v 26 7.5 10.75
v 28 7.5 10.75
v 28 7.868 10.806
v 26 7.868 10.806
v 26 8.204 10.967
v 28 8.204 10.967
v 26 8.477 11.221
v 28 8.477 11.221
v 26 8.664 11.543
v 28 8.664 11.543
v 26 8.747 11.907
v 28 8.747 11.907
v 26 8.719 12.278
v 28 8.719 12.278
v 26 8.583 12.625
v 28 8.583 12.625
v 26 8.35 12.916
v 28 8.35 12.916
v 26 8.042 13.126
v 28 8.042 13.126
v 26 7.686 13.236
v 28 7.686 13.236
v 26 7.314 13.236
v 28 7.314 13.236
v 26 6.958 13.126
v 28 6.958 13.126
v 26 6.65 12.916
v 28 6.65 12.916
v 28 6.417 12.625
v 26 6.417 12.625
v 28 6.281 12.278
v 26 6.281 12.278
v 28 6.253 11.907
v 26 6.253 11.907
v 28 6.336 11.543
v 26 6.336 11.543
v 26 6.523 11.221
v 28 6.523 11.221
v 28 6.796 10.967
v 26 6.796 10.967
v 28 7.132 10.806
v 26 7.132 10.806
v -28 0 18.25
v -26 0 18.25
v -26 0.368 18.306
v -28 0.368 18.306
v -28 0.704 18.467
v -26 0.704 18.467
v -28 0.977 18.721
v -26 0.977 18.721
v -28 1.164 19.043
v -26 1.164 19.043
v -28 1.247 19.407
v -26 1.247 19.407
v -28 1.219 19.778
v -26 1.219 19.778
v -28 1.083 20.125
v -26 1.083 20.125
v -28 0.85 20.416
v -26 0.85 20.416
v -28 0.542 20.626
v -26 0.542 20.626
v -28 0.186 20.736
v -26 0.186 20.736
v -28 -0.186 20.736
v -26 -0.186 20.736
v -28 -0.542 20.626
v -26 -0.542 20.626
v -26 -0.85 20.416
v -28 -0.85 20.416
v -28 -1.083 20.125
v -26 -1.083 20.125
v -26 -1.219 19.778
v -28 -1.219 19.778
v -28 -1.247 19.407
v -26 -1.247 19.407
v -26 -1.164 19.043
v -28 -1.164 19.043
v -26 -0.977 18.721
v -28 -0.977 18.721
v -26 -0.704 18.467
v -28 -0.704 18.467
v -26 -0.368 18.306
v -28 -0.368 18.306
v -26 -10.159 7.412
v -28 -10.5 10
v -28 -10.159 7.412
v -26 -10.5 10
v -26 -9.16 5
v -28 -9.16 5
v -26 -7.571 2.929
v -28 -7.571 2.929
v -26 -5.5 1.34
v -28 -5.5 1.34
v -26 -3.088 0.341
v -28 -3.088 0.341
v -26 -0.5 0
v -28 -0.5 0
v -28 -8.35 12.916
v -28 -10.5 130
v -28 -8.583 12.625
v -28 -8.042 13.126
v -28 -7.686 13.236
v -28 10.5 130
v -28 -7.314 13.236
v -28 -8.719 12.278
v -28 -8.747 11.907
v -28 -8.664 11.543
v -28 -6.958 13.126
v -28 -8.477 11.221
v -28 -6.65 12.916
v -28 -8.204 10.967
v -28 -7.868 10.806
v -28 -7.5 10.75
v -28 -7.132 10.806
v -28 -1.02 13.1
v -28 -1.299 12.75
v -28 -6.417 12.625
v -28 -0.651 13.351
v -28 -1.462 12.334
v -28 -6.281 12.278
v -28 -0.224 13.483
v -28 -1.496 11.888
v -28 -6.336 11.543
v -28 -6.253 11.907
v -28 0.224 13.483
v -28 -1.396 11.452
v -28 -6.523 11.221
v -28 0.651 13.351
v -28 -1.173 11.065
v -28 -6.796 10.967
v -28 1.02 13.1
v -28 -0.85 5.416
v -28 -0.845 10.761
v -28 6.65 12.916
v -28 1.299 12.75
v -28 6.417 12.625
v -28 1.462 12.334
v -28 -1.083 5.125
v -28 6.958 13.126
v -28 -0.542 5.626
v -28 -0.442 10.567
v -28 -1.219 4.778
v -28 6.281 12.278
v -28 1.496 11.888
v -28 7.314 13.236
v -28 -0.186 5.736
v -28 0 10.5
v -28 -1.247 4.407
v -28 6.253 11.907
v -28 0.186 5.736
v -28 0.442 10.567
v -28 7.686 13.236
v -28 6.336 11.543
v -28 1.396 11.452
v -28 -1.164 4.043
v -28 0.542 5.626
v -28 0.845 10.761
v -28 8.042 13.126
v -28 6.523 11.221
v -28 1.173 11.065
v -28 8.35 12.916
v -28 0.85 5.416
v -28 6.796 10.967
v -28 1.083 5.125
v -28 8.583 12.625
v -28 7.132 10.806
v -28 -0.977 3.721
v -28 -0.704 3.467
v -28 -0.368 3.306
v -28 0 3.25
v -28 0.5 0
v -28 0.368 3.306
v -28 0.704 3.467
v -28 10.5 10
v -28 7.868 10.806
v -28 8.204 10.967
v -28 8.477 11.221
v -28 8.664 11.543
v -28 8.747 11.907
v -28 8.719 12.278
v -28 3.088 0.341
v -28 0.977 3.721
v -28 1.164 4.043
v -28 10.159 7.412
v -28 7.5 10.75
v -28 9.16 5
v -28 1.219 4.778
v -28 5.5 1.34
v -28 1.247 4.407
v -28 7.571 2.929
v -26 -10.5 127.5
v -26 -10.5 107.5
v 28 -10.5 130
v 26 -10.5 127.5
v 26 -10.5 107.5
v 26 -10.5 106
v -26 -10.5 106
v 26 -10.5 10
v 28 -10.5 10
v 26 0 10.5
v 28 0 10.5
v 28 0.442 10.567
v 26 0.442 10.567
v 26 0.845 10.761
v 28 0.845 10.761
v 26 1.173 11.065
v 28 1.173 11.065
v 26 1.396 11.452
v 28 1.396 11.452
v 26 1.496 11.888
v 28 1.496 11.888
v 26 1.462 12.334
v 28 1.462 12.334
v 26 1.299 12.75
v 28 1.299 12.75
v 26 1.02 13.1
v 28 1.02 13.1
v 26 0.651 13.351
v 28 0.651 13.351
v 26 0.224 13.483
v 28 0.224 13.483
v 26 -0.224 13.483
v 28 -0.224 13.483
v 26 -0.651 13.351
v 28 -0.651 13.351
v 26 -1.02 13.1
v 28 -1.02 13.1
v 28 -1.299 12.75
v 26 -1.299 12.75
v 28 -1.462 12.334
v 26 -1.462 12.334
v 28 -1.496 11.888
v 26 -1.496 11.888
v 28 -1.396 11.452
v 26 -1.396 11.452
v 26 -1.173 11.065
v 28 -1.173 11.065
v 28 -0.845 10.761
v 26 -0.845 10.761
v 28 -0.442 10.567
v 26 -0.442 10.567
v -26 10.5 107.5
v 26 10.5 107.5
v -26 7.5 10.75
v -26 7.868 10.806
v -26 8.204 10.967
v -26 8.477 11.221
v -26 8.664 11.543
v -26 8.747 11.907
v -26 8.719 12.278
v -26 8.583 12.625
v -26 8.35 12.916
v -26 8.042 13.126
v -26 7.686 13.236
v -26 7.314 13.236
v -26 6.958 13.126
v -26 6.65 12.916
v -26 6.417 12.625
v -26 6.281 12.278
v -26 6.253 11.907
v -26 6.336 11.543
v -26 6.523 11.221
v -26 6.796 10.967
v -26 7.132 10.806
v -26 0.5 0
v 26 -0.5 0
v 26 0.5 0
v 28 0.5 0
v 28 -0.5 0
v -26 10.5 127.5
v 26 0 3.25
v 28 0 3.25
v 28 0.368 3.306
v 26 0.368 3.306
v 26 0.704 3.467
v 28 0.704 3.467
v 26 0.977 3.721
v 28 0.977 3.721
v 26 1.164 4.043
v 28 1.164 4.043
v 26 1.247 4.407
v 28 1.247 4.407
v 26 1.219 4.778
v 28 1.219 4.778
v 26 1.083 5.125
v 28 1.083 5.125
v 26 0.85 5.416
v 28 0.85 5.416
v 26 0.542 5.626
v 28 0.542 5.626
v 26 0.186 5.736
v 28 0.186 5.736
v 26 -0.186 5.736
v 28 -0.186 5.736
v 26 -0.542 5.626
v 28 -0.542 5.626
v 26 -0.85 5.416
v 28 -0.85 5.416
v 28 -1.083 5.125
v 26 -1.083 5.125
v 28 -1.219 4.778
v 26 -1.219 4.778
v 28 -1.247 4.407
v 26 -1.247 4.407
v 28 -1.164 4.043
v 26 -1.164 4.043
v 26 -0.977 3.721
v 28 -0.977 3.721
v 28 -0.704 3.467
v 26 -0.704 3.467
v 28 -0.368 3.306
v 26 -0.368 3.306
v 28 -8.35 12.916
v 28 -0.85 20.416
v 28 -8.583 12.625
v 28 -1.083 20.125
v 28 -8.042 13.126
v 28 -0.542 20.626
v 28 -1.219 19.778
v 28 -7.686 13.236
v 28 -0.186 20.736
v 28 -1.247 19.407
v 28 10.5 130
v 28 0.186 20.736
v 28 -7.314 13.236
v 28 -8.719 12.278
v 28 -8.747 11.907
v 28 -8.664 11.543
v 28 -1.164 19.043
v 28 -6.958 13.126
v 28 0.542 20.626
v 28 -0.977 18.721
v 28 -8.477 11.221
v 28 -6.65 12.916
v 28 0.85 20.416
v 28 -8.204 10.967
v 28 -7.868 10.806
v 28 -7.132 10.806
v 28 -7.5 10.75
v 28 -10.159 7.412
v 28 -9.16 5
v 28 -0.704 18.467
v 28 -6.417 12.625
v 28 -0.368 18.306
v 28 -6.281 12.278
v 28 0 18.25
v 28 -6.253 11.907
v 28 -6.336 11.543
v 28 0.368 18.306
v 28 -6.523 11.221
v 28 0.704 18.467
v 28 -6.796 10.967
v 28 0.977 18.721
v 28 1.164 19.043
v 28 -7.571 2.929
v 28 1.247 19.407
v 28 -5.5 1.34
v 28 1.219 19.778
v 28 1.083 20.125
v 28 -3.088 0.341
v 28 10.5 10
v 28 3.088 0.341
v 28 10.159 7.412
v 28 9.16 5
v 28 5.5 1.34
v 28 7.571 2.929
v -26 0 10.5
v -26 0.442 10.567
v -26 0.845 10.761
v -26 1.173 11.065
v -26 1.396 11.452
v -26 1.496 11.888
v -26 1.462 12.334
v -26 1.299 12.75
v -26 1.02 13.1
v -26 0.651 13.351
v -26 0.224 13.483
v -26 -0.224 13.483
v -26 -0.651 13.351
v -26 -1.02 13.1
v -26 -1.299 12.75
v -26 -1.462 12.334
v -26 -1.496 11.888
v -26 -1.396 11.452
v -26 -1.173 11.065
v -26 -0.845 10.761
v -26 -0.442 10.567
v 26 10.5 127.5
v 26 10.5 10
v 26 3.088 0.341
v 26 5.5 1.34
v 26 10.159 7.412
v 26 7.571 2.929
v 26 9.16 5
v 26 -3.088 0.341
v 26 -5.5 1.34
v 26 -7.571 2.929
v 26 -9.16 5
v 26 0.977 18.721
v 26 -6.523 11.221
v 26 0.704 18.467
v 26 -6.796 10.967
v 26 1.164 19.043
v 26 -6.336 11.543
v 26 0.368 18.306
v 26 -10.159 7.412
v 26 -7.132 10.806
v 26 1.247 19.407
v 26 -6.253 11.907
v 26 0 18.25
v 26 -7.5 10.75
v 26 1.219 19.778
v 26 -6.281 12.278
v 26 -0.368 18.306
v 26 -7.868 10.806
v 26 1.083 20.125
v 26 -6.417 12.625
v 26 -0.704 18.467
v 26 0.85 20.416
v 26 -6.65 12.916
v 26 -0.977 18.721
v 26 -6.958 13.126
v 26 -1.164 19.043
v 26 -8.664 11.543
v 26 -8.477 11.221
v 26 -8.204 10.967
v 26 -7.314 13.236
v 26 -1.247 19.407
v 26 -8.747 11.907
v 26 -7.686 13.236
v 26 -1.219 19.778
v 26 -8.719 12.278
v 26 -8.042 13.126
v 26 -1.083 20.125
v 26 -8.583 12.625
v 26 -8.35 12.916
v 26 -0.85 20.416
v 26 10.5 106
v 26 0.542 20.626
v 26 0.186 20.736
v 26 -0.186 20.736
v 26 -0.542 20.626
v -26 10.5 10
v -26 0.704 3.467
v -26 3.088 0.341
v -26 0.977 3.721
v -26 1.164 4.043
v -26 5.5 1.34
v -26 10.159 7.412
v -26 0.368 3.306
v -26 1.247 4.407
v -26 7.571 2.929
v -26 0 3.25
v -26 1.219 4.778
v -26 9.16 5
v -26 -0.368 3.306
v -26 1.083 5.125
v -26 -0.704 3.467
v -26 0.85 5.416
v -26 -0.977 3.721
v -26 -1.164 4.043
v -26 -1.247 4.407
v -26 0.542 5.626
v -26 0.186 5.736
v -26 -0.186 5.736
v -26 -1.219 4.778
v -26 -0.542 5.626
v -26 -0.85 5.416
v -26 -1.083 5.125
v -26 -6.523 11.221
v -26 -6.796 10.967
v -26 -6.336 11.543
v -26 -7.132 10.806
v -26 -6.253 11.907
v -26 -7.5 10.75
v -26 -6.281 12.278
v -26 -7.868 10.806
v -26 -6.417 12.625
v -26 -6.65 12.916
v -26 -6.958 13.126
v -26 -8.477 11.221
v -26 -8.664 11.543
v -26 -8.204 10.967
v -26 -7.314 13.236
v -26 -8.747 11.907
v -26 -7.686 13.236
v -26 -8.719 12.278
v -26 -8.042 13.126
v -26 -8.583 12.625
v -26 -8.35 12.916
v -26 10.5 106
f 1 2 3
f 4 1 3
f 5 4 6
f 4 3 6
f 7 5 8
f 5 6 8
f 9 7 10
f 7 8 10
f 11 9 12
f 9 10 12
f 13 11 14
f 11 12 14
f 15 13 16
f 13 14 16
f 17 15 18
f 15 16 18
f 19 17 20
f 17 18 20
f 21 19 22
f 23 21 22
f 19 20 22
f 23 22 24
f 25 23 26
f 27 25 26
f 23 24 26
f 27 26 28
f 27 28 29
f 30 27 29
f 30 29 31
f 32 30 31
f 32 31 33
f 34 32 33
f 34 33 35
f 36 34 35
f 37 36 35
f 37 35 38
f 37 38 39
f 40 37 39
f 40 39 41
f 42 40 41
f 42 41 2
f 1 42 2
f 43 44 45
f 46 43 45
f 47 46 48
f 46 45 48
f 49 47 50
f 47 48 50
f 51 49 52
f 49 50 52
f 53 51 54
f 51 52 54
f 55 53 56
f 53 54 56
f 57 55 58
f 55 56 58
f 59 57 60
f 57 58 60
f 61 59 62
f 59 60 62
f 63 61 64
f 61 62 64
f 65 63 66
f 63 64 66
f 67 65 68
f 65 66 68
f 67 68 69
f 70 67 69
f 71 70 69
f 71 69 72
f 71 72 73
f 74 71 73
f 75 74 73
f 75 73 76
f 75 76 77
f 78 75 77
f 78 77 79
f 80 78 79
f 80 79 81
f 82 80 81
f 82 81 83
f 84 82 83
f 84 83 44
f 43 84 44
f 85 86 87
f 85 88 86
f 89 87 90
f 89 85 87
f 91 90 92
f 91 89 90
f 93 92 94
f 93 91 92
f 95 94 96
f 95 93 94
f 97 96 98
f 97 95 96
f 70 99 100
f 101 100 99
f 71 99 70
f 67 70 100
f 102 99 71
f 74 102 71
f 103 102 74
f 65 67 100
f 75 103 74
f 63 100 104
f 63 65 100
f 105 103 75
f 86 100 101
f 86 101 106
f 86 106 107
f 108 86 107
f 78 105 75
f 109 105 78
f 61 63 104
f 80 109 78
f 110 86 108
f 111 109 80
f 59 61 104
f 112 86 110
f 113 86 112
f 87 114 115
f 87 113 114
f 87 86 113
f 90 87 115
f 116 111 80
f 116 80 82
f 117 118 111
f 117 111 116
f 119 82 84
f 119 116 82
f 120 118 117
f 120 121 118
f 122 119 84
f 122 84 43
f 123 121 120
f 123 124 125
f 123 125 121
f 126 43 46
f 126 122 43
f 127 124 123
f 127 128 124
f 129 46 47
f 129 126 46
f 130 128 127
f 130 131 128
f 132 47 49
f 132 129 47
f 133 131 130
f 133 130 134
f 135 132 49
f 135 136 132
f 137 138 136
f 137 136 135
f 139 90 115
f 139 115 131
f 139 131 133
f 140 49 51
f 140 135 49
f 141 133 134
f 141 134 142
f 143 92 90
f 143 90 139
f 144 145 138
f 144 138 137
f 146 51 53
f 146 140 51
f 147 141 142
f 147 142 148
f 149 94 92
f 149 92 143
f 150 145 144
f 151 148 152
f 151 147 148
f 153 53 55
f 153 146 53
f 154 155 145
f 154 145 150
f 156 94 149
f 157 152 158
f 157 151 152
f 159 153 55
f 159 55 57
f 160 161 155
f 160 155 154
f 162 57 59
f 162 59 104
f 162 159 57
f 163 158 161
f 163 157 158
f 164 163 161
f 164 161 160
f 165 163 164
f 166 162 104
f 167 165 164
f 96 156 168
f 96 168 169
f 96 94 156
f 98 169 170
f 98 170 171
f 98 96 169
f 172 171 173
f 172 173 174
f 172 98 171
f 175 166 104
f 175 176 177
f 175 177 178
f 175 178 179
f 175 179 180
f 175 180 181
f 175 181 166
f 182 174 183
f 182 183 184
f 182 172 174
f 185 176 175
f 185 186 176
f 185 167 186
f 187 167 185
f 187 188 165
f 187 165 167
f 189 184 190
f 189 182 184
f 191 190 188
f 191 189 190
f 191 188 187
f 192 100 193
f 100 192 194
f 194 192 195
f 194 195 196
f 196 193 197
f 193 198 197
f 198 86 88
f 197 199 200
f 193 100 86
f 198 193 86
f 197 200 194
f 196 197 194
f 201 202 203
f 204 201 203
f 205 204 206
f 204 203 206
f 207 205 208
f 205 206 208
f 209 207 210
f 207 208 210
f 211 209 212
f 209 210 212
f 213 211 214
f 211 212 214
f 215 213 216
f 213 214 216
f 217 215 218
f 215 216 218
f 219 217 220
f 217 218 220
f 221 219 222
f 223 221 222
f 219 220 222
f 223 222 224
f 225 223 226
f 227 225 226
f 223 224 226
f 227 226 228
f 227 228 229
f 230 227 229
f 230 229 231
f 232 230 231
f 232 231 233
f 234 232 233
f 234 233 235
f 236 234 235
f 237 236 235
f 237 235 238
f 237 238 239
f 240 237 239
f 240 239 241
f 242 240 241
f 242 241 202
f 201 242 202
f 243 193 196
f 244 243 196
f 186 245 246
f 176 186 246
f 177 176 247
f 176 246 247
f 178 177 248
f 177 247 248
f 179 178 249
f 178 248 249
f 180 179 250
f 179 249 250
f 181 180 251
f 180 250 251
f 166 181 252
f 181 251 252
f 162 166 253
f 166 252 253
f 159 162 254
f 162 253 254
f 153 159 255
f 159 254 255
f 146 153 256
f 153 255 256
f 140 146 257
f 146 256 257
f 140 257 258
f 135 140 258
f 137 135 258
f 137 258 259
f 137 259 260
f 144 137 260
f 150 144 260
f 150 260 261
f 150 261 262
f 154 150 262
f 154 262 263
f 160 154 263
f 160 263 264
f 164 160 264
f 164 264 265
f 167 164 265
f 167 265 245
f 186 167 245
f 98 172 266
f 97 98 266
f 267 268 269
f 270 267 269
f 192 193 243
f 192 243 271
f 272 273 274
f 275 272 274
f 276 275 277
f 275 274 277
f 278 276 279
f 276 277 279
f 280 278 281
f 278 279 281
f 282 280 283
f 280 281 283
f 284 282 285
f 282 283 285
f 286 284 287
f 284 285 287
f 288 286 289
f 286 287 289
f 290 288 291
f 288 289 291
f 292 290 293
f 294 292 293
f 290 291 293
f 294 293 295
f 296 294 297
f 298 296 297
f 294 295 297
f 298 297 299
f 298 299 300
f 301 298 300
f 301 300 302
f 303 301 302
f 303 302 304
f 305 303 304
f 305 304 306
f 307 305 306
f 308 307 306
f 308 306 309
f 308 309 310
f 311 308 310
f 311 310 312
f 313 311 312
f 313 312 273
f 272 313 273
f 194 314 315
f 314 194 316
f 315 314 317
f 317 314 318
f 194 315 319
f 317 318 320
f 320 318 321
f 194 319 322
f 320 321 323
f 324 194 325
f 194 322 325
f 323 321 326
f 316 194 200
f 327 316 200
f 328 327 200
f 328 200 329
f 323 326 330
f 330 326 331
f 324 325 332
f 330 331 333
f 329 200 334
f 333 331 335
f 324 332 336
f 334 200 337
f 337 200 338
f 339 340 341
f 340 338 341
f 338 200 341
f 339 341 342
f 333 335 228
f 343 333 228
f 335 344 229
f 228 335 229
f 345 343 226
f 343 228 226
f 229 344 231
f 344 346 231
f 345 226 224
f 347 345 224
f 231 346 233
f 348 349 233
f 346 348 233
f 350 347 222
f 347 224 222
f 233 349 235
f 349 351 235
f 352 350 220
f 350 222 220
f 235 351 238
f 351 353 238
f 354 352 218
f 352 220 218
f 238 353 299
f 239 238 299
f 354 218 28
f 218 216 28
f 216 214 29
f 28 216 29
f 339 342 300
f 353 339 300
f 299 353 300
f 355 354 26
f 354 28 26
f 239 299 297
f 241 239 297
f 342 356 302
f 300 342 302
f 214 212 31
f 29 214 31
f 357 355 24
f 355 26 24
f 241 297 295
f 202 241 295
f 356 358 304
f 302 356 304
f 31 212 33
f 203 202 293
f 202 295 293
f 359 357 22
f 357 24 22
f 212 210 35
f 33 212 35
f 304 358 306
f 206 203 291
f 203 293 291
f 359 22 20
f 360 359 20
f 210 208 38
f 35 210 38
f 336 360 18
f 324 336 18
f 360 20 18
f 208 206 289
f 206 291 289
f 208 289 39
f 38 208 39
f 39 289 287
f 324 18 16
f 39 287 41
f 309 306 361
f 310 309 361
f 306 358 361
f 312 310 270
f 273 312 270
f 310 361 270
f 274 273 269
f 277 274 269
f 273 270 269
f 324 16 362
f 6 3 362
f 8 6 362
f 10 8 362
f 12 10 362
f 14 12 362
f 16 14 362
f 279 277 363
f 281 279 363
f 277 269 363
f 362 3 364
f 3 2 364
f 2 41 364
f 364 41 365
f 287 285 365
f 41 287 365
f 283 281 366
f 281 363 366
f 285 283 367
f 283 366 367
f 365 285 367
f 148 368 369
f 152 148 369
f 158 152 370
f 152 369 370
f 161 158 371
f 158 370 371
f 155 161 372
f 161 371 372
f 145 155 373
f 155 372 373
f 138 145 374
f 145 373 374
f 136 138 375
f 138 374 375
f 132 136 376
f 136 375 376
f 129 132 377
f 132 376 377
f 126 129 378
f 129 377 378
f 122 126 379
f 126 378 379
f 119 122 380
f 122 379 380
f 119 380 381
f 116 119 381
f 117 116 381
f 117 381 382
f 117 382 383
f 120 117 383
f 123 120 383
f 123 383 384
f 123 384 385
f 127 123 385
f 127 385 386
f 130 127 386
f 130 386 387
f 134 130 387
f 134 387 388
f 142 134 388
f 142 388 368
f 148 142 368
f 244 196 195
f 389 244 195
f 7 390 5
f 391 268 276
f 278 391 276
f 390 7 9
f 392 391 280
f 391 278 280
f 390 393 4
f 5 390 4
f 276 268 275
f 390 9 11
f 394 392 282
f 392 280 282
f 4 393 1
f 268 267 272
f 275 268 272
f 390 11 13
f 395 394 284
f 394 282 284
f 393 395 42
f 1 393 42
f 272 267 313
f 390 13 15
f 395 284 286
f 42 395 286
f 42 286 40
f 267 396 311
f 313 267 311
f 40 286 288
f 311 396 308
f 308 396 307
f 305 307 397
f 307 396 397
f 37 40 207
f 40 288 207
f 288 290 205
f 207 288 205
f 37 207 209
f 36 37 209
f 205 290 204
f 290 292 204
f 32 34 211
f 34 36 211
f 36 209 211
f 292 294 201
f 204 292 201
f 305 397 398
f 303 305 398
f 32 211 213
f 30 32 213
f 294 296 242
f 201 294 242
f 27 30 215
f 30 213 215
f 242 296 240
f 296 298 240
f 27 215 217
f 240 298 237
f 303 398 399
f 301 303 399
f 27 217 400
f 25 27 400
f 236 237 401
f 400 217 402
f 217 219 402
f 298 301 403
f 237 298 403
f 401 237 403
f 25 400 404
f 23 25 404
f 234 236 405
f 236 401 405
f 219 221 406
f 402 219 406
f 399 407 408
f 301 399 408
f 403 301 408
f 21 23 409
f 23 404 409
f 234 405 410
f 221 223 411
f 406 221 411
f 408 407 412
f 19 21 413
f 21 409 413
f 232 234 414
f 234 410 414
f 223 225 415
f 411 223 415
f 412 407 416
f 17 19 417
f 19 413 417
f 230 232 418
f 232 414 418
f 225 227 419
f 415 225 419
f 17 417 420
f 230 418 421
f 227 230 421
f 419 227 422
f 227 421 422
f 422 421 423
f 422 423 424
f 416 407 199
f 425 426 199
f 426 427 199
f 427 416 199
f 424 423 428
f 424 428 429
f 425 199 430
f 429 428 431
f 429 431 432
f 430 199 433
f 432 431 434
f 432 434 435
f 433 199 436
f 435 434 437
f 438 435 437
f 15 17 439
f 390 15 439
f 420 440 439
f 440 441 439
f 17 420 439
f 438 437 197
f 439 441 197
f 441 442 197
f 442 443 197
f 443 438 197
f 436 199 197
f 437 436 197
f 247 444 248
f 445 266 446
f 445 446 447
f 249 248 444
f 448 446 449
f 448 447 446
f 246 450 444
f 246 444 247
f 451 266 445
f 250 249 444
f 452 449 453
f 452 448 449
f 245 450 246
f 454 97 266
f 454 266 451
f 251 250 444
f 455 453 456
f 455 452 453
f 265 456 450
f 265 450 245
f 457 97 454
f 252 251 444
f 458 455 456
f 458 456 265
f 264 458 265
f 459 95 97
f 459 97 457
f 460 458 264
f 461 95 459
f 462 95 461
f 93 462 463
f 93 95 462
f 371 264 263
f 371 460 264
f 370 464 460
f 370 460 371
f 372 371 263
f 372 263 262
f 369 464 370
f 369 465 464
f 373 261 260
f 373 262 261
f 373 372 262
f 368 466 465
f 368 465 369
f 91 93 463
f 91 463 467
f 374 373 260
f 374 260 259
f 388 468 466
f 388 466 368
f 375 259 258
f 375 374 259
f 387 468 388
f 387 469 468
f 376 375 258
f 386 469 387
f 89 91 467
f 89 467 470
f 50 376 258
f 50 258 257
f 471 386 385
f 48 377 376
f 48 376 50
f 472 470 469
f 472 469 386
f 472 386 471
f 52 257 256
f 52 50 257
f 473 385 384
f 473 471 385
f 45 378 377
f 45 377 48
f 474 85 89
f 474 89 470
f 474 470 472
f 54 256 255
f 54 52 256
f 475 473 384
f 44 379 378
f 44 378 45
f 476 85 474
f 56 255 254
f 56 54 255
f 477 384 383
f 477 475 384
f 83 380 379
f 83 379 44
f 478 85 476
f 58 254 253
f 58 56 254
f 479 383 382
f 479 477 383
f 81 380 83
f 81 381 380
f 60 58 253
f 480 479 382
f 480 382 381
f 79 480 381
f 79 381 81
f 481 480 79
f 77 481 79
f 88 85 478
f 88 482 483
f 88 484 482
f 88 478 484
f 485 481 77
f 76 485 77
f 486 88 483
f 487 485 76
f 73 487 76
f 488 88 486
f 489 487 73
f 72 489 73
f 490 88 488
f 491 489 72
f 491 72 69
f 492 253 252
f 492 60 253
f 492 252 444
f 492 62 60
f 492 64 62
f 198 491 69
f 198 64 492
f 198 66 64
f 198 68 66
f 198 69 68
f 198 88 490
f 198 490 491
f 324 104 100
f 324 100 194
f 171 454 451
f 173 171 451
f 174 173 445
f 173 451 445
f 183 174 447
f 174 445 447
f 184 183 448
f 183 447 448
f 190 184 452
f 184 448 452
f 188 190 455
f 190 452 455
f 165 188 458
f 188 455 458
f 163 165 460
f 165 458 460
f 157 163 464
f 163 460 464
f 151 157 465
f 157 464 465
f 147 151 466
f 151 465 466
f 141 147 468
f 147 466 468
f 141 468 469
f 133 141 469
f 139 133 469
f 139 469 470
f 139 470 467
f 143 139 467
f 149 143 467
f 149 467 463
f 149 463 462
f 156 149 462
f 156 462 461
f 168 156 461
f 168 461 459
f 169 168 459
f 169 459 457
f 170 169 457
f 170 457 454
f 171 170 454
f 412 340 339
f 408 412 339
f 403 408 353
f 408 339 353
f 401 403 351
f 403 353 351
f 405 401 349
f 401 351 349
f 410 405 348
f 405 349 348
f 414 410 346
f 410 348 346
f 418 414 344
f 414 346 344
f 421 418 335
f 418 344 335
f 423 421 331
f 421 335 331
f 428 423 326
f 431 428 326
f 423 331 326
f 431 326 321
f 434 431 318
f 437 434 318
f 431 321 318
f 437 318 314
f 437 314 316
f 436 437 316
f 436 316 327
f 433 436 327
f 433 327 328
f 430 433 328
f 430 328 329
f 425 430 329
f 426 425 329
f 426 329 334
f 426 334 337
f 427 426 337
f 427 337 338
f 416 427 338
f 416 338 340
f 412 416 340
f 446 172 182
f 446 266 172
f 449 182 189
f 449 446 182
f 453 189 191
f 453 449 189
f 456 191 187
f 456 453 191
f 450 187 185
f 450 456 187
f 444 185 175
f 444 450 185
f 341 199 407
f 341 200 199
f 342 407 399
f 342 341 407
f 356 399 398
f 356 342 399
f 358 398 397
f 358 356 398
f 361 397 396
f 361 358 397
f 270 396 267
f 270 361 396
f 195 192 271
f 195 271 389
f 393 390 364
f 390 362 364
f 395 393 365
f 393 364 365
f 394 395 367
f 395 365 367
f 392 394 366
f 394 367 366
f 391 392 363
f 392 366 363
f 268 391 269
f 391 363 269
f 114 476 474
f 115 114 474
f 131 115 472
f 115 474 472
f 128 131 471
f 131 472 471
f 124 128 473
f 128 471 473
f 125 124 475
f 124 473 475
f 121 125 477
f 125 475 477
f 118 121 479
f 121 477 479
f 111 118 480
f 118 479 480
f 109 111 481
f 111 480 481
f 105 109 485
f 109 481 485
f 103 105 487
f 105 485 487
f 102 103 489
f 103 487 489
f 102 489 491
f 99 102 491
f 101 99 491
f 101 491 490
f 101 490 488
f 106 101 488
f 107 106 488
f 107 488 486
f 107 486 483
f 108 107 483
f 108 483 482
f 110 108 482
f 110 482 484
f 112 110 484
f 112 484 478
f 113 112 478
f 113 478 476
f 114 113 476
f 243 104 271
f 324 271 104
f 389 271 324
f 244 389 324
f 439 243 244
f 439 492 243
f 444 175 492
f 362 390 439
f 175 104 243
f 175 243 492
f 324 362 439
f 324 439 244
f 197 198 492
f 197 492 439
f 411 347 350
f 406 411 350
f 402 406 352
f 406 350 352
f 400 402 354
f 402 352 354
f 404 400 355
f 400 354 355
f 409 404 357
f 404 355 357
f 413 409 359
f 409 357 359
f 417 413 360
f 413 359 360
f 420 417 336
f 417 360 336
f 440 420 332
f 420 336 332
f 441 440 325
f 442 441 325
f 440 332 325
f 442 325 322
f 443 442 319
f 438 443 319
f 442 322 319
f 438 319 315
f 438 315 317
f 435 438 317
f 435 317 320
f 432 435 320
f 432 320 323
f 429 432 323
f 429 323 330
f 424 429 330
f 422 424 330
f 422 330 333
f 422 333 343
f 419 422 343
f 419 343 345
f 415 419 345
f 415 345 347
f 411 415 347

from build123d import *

# Parameters (mm, degrees)
SKETCH3_W           = 56
SKETCH3_H           = 21
BOSS_EXTRUDE1_DEPTH = 130
SKETCH4_W           = 52
SKETCH4_H           = 106
SKETCH4_H_2         = 20
CUT_EXTRUDE3_DEPTH  = 22
SKETCH6_R           = 1.5
SKETCH6_R_2         = 1.25
CUT_EXTRUDE4_DEPTH  = 57
FILLET1_R           = 10


with BuildPart() as part:
    # Sketch3 → Boss-Extrude1 (new body)
    with BuildSketch(Plane.XY):
        Rectangle(SKETCH3_W, SKETCH3_H)
    extrude(amount=BOSS_EXTRUDE1_DEPTH)

    # Sketch4 → Cut-Extrude3 (cut, through all)
    with BuildSketch(Plane.XZ.offset(10.5)):
        with Locations((0, 53)):
            Rectangle(SKETCH4_W, SKETCH4_H)
        with Locations((0, 117.5)):
            Rectangle(SKETCH4_W, SKETCH4_H_2)
    extrude(amount=-CUT_EXTRUDE3_DEPTH, mode=Mode.SUBTRACT)

    # Sketch6 → Cut-Extrude4 (cut, through all)
    with BuildSketch(Plane(origin=(28, 0, 0), x_dir=(0, 0, -1), z_dir=(1, 0, 0))):
        with Locations((-12, 0)):
            Circle(SKETCH6_R)
        with Locations((-4.5, 0)):
            Circle(SKETCH6_R_2)
        with Locations((-19.5, 0)):
            Circle(SKETCH6_R_2)
        with Locations((-12, 7.5)):
            Circle(SKETCH6_R_2)
        with Locations((-12, -7.5)):
            Circle(SKETCH6_R_2)
    extrude(amount=-CUT_EXTRUDE4_DEPTH, mode=Mode.SUBTRACT)

    # Fillet1
    fillet1_edges = [part.edges().sort_by_distance(p)[0] for p in [
        (27, -10.5, 0),
        (-27, 10.5, 0),
        (-27, -10.5, 0),
        (27, 10.5, 0),
    ]]
    fillet(fillet1_edges, radius=FILLET1_R)


solid = part.part
